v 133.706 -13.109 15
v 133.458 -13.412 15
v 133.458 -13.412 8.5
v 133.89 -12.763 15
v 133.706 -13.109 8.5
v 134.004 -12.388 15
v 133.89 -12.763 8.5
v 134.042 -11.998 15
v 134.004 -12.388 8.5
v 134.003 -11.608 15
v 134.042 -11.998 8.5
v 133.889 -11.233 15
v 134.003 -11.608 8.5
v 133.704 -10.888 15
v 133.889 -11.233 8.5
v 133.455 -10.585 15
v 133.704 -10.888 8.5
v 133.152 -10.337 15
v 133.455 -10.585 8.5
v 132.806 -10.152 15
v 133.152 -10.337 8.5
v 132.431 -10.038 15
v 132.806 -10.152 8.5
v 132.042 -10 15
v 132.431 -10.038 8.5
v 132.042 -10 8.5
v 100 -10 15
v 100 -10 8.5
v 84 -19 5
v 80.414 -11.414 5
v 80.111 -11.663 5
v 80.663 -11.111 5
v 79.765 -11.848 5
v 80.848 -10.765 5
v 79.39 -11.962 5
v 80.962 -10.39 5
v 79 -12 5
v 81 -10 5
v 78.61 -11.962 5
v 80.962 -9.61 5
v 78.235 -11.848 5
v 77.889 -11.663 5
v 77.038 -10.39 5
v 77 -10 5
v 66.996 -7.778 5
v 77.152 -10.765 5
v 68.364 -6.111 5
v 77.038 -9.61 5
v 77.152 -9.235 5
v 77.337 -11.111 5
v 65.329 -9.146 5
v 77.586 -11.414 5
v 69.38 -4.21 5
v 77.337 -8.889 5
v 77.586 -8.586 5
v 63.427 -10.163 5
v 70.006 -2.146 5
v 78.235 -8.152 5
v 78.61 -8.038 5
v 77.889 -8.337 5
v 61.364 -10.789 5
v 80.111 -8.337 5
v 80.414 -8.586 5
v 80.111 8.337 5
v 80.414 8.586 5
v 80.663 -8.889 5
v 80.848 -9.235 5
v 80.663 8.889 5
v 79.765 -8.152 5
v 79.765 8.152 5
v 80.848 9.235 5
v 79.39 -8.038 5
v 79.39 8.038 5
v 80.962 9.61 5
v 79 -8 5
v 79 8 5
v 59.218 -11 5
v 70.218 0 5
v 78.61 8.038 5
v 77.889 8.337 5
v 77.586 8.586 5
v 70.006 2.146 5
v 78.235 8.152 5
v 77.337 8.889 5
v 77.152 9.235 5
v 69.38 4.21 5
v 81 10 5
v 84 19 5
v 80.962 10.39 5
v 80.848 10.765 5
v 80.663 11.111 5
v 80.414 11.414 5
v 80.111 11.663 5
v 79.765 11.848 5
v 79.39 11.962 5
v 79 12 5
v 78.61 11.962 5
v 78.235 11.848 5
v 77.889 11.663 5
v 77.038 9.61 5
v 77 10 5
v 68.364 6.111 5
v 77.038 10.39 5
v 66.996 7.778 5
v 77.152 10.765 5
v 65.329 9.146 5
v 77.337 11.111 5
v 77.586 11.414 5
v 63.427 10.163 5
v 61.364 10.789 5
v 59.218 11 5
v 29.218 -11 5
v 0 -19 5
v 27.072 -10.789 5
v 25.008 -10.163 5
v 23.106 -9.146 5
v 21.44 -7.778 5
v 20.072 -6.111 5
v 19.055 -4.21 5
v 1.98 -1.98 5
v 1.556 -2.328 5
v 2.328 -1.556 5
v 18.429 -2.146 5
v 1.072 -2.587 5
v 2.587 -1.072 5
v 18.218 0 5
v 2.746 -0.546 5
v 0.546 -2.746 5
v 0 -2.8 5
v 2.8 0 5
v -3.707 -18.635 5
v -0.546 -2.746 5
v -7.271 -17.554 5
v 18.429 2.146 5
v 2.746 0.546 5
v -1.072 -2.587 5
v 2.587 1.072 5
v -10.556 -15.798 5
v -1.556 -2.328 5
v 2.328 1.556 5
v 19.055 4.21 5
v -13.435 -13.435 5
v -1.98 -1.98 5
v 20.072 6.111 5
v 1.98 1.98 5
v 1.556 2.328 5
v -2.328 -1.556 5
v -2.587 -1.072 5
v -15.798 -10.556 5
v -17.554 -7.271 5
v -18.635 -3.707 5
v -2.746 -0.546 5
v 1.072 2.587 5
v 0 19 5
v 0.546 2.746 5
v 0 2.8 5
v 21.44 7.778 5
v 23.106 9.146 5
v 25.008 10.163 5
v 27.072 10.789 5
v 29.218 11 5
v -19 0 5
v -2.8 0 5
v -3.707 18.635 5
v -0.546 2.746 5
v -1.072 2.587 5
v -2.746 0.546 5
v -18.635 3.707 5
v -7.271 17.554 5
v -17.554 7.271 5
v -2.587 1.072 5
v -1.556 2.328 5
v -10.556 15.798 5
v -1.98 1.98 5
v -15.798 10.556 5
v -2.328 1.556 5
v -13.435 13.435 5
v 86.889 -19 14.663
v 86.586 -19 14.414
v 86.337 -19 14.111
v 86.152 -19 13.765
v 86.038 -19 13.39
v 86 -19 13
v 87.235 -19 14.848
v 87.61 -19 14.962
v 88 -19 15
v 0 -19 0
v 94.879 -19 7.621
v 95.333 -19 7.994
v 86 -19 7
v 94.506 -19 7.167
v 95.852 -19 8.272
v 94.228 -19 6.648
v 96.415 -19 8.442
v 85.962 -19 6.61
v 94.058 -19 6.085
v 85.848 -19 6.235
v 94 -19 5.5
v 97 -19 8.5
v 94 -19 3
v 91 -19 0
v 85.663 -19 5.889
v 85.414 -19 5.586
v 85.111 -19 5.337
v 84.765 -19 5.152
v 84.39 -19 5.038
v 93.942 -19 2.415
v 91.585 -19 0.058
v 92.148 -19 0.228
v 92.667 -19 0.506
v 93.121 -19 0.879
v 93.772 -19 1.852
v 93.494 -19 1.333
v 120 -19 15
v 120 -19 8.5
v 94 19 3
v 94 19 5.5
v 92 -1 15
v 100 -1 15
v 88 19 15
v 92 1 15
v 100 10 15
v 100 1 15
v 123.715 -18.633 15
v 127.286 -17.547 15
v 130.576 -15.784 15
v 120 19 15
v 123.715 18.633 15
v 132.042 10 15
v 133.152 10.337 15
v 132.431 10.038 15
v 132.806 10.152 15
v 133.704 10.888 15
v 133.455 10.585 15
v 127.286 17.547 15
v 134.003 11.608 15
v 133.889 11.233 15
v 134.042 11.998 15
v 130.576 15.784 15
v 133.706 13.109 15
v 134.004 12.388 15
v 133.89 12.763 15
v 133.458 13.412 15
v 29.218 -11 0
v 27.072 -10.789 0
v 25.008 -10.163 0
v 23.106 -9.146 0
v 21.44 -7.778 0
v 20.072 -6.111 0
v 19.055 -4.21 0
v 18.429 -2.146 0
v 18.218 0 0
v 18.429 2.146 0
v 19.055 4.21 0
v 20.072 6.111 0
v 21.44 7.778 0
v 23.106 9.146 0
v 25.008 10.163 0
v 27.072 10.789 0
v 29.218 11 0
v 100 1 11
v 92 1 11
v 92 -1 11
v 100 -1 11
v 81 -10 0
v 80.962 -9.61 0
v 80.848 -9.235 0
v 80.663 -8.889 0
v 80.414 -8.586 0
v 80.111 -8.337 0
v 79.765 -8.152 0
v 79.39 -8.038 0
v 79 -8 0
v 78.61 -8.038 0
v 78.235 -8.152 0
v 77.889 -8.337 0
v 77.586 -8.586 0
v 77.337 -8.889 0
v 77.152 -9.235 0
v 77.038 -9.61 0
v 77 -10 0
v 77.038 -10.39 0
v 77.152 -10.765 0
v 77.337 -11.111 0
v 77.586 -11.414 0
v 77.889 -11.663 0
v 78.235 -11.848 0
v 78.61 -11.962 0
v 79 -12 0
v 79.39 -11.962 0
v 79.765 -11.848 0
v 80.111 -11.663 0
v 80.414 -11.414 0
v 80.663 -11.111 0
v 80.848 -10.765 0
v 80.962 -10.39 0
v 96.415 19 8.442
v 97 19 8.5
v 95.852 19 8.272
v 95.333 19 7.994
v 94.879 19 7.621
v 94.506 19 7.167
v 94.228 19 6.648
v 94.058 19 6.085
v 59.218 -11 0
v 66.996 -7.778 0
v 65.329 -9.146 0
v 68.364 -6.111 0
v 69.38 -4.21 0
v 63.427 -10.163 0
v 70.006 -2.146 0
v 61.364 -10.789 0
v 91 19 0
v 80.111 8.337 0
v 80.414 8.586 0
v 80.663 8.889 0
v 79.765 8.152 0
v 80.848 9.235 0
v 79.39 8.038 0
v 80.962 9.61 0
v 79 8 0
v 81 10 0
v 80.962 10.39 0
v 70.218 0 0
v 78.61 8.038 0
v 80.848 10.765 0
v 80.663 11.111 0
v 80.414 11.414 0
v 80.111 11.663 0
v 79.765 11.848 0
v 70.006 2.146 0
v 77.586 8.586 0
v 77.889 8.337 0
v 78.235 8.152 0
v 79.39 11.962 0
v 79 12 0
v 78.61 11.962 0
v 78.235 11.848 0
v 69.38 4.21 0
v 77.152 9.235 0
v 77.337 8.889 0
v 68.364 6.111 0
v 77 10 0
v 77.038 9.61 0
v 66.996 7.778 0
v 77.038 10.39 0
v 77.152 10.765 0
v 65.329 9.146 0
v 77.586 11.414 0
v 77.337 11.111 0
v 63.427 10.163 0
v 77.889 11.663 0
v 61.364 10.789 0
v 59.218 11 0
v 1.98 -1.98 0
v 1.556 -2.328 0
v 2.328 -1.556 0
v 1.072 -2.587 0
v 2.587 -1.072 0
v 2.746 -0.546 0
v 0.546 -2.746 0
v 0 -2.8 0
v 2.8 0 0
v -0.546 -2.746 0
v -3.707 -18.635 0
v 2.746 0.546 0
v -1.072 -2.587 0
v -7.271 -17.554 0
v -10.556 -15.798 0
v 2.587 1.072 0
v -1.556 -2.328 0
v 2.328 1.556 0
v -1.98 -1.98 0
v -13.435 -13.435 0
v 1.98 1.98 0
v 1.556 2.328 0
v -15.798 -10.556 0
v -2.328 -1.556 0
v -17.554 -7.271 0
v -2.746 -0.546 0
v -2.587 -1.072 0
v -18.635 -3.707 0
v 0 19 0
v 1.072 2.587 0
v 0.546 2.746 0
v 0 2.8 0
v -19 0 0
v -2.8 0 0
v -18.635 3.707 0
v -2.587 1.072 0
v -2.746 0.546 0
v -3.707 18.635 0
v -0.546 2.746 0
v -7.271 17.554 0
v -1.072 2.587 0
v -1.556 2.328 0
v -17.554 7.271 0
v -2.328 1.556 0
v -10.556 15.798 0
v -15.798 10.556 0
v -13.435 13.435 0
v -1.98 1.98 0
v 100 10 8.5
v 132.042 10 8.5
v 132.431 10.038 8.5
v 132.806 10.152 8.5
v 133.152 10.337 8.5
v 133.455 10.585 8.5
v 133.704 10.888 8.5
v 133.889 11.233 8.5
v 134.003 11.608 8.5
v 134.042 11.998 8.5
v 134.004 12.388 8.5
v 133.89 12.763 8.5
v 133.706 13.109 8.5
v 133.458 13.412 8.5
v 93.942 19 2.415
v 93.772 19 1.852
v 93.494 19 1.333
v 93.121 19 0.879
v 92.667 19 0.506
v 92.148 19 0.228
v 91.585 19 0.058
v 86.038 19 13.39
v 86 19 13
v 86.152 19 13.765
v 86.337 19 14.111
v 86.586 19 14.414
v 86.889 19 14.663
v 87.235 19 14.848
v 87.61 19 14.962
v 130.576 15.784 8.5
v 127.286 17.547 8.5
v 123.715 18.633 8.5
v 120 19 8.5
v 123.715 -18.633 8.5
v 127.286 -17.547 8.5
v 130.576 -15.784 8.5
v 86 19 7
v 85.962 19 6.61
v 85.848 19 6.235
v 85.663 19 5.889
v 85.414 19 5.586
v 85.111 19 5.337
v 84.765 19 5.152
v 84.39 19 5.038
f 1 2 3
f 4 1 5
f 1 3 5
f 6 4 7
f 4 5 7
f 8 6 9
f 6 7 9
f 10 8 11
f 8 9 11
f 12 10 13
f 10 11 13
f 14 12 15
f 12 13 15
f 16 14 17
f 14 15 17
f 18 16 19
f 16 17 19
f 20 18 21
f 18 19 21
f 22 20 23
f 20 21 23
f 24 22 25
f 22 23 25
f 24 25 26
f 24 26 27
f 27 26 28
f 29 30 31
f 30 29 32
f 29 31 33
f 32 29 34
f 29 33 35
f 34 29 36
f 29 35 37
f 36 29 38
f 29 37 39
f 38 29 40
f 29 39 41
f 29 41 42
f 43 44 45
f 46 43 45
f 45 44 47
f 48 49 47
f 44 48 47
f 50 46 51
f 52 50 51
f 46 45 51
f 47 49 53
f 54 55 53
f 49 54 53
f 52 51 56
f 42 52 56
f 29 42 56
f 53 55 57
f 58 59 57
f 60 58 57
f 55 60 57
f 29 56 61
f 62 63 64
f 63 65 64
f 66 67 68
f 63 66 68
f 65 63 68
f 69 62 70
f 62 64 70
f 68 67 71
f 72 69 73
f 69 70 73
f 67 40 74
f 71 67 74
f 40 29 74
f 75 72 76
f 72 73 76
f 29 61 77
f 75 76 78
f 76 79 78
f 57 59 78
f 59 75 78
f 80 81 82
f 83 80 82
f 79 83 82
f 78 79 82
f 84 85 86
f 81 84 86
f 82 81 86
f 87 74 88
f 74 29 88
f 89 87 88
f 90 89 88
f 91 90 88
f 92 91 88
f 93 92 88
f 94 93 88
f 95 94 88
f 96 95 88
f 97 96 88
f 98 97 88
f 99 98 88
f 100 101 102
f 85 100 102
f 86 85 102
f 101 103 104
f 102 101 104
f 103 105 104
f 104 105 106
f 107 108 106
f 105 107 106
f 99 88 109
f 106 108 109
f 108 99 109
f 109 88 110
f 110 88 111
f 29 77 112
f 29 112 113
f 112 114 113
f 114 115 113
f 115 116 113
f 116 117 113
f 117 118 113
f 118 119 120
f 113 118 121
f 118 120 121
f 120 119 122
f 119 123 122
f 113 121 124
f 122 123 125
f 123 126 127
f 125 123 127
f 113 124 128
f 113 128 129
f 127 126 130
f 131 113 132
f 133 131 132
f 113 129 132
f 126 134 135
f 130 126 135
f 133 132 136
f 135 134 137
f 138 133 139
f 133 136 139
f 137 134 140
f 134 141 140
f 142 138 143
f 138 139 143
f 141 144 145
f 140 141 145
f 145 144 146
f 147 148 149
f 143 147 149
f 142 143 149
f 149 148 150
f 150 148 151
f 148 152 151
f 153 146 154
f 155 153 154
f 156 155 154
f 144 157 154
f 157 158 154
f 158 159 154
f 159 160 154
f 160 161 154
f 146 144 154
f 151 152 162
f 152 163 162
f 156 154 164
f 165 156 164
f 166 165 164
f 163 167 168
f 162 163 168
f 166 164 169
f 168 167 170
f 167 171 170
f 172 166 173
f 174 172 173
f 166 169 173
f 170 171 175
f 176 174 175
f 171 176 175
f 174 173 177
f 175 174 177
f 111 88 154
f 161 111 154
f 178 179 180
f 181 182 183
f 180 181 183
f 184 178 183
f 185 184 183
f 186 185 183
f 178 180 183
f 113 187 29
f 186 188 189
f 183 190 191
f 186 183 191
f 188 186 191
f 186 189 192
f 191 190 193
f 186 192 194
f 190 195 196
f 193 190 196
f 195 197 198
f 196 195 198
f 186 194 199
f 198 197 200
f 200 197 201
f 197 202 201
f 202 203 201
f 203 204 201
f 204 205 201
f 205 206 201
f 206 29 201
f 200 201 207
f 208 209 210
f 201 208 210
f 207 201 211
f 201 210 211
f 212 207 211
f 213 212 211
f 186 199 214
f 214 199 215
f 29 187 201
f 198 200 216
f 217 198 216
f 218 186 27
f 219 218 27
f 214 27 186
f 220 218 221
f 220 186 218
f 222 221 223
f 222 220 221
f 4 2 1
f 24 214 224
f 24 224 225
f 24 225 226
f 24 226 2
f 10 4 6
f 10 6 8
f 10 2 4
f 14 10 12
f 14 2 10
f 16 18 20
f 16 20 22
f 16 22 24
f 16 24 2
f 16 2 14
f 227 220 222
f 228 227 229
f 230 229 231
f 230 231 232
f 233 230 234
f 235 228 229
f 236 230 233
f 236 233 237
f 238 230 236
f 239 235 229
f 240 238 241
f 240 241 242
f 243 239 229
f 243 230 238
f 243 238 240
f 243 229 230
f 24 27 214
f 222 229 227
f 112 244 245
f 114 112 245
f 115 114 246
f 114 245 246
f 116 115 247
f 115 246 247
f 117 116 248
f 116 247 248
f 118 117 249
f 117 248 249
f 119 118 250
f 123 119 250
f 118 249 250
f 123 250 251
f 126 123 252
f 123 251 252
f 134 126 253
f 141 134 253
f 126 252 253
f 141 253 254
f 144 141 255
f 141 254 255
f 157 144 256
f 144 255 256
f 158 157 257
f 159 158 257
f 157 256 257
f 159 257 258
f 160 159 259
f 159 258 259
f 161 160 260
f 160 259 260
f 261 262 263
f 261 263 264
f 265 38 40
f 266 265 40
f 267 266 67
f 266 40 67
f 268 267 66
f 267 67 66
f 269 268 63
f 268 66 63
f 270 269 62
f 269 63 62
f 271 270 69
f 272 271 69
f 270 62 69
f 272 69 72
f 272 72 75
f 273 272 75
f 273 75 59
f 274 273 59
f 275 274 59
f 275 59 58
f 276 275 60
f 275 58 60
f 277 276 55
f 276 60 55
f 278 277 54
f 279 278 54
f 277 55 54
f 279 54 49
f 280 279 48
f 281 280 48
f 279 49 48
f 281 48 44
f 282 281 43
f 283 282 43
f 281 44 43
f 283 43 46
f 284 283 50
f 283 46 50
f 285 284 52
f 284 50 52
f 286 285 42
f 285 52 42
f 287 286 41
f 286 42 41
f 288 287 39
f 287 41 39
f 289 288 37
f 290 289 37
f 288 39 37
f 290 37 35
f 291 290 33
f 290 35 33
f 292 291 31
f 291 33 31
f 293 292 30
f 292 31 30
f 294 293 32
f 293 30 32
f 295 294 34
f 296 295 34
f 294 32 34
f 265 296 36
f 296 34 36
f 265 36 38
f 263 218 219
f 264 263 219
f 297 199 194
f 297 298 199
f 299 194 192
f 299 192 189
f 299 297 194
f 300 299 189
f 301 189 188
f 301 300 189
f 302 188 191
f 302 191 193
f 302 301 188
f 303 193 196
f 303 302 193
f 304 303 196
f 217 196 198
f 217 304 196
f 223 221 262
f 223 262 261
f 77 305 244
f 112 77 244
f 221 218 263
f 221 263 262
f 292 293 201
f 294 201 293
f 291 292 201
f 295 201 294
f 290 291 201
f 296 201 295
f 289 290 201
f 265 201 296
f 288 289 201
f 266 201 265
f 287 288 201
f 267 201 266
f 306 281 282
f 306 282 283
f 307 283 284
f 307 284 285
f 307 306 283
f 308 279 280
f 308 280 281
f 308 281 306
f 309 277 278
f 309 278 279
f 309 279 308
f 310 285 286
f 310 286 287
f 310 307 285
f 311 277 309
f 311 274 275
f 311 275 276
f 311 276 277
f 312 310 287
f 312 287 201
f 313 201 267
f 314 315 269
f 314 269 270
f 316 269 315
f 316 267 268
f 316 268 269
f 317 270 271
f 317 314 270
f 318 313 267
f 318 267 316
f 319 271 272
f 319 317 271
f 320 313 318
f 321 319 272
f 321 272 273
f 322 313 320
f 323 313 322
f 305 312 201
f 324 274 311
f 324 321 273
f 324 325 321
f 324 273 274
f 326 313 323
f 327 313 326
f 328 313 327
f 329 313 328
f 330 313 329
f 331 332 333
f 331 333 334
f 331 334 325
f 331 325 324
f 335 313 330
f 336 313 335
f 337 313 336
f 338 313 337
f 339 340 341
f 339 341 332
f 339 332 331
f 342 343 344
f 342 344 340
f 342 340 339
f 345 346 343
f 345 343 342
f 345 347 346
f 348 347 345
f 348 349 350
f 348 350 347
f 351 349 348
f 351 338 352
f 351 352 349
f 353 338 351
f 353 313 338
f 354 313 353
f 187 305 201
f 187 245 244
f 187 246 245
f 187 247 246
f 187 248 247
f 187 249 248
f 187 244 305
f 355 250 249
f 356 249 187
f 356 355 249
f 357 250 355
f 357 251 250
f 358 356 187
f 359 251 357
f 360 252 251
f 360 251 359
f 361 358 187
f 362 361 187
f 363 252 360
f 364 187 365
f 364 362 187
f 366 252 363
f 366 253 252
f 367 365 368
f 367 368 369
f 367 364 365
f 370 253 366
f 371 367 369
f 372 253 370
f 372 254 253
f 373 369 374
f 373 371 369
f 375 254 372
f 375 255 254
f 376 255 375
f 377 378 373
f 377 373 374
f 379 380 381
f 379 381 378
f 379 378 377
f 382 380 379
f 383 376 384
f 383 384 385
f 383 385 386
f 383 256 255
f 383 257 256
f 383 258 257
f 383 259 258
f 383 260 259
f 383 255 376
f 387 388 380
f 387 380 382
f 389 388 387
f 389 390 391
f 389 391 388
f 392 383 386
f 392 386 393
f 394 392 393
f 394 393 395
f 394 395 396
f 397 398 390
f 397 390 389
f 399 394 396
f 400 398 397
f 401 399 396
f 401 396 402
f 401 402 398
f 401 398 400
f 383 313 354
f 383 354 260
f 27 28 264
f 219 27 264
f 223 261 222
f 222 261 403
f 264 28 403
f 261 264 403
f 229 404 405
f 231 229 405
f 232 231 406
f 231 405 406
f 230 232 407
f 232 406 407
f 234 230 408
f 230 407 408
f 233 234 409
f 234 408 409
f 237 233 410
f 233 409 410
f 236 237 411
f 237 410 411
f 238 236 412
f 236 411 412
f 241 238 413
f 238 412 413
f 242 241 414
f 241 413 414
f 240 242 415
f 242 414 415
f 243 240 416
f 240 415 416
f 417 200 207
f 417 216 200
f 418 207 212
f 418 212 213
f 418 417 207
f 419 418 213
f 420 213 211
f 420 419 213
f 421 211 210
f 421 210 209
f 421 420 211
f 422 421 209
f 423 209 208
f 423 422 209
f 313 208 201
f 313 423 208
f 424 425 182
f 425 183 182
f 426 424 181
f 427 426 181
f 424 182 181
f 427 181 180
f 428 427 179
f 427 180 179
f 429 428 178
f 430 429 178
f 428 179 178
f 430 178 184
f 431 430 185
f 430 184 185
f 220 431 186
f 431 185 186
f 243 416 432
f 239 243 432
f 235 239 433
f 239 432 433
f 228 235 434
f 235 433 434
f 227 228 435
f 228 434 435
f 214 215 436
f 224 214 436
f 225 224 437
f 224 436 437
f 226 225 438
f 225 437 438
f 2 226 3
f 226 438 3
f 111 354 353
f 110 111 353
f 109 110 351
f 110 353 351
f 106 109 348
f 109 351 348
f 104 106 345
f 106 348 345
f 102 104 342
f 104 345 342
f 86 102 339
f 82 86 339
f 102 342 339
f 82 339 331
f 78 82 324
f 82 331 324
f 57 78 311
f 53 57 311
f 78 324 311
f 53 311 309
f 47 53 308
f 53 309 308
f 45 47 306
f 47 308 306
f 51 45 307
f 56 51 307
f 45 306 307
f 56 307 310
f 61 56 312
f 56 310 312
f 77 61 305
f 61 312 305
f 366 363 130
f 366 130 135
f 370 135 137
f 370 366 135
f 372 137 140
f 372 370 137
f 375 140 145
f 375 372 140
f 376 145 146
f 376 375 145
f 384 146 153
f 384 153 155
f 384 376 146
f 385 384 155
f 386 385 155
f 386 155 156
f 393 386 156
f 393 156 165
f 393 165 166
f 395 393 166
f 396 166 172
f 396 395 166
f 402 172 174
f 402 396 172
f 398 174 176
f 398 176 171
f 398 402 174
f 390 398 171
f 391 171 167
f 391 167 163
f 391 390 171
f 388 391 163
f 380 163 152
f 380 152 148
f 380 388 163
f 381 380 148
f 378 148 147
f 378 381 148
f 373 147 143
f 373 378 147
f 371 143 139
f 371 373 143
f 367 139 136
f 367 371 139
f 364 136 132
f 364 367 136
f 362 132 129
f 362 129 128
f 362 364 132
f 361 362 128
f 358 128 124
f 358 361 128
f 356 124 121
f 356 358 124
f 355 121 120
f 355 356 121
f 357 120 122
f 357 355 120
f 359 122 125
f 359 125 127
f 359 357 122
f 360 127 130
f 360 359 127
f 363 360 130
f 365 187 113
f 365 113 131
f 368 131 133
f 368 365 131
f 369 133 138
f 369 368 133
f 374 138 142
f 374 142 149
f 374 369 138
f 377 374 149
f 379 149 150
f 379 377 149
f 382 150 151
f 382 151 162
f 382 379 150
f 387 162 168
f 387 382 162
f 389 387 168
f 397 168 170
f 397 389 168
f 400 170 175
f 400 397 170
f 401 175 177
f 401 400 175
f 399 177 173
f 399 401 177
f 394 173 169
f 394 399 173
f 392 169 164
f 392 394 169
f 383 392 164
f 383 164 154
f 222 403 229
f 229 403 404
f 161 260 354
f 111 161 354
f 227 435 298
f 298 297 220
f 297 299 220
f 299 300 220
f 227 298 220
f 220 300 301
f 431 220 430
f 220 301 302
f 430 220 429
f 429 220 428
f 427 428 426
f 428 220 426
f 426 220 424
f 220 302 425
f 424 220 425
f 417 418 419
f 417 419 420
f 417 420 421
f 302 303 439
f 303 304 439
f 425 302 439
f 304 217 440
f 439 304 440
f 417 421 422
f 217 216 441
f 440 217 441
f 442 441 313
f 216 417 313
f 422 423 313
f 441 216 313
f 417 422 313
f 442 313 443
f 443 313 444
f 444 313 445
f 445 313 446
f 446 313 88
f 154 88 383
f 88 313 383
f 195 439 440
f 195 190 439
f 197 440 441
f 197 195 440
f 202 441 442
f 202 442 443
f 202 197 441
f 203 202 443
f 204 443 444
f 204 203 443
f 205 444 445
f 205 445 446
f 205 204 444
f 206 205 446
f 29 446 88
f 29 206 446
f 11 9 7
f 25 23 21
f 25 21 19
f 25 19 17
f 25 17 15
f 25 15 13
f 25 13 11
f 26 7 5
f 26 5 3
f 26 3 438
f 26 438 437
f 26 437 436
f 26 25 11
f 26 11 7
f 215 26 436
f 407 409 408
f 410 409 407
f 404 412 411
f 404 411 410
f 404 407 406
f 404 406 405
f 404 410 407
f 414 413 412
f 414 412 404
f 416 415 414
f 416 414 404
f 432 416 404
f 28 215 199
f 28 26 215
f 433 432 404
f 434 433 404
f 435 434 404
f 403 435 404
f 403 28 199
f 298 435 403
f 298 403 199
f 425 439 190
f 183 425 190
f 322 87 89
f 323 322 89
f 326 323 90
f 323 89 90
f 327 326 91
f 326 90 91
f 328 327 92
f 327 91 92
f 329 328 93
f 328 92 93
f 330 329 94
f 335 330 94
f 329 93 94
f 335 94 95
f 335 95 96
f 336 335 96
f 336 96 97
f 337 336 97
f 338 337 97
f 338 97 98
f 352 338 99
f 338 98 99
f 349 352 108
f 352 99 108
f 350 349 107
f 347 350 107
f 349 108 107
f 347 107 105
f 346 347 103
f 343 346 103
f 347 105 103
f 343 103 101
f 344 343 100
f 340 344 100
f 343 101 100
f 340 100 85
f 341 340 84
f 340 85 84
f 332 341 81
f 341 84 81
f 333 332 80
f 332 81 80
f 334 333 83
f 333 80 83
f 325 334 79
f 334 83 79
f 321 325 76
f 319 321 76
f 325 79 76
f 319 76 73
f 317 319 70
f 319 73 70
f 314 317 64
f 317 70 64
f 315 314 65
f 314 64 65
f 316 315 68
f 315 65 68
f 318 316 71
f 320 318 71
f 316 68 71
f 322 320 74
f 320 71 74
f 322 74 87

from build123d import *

# Parameters (mm, degrees)
SKETCH1_R           = 2.8
BOSS_EXTRUDE1_DEPTH = 5
FILLET1_R           = 2
BOSS_EXTRUDE2_DEPTH = 10
FILLET2_R           = 2
SKETCH3_W           = 8
SKETCH3_H           = 2
CUT_EXTRUDE1_DEPTH  = 4
SKETCH5_R           = 2
CUT_EXTRUDE2_DEPTH  = 5
SKETCH6_W           = 89.229867451
SKETCH6_H           = 38
CUT_EXTRUDE3_DEPTH  = 8.5
FILLET3_R           = 3


with BuildPart() as part:
    # Sketch1 → Boss-Extrude1 (new body)
    with BuildSketch(Plane.XY):
        with BuildLine():
            Line((0, 19), (120, 19))
            ThreePointArc((120, 19), (129.246621004, 16.598192673), (136.155494421, 10))
            Line((136.155494421, 10), (100, 10))
            Line((100, 10), (100, -10))
            Line((100, -10), (136.155494421, -10))
            ThreePointArc((136.155494421, -10), (129.246621004, -16.598192673), (120, -19))
            Line((120, -19), (0, -19))
            ThreePointArc((0, -19), (-19, 0), (0, 19))
        make_face()
        Circle(SKETCH1_R, mode=Mode.SUBTRACT)
        with BuildLine():
            Line((29.217733251, 11), (59.217733251, 11))
            ThreePointArc((59.217733251, 11), (70.217733251, 0), (59.217733251, -11))
            Line((59.217733251, -11), (29.217733251, -11))
            ThreePointArc((29.217733251, -11), (18.217733251, 0), (29.217733251, 11))
        make_face(mode=Mode.SUBTRACT)
    extrude(amount=BOSS_EXTRUDE1_DEPTH)

    # Fillet1
    fillet1_edges = [part.edges().sort_by_distance(p)[0] for p in [
        (136.155494421, 10, 2.5),
        (136.155494421, -10, 2.5),
    ]]
    fillet(fillet1_edges, radius=FILLET1_R)

    # Sketch2 → Boss-Extrude2 (add)
    with BuildSketch(Plane.XY.offset(5)):
        with BuildLine():
            Line((86, 19), (86, -19))
            Line((86, -19), (120, -19))
            ThreePointArc((120, -19), (127.286167394, -17.547414758), (133.458252765, -13.411764706))
            ThreePointArc((133.458252765, -13.411764706), (133.888690869, -11.233035011), (132.041594579, -10))
            Line((132.041594579, -10), (100, -10))
            Line((100, -10), (100, 10))
            Line((100, 10), (132.041594579, 10))
            ThreePointArc((132.041594579, 10), (133.888690869, 11.233035011), (133.458252765, 13.411764706))
            ThreePointArc((133.458252765, 13.411764706), (127.286167394, 17.547414758), (120, 19))
            Line((120, 19), (86, 19))
        make_face()
    extrude(amount=BOSS_EXTRUDE2_DEPTH)

    # Fillet2
    fillet2_edges = [part.edges().sort_by_distance(p)[0] for p in [
        (86, 0, 5),
        (86, 0, 15),
    ]]
    fillet(fillet2_edges, radius=FILLET2_R)

    # Sketch3 → Cut-Extrude1 (cut)
    with BuildSketch(Plane.XY.offset(15)):
        with Locations((96, 0)):
            Rectangle(SKETCH3_W, SKETCH3_H)
    extrude(amount=-CUT_EXTRUDE1_DEPTH, mode=Mode.SUBTRACT)

    # Sketch5 → Cut-Extrude2 (cut)
    with BuildSketch(Plane.XY.offset(5)):
        with Locations((79, 10)):
            Circle(SKETCH5_R)
        with Locations((79, -10)):
            Circle(SKETCH5_R)
    extrude(amount=-CUT_EXTRUDE2_DEPTH, mode=Mode.SUBTRACT)

    # Sketch6 → Cut-Extrude3 (cut)
    with BuildSketch(Plane(origin=(0, 0, 0), x_dir=(-1, 0, 0), z_dir=(0, 0, -1))):
        with Locations((-138.614933726, 0)):
            Rectangle(SKETCH6_W, SKETCH6_H)
    extrude(amount=-CUT_EXTRUDE3_DEPTH, mode=Mode.SUBTRACT)

    # Fillet3
    fillet3_edges = [part.edges().sort_by_distance(p)[0] for p in [
        (94, 0, 0),
        (94, 0, 8.5),
    ]]
    fillet(fillet3_edges, radius=FILLET3_R)


solid = part.part
